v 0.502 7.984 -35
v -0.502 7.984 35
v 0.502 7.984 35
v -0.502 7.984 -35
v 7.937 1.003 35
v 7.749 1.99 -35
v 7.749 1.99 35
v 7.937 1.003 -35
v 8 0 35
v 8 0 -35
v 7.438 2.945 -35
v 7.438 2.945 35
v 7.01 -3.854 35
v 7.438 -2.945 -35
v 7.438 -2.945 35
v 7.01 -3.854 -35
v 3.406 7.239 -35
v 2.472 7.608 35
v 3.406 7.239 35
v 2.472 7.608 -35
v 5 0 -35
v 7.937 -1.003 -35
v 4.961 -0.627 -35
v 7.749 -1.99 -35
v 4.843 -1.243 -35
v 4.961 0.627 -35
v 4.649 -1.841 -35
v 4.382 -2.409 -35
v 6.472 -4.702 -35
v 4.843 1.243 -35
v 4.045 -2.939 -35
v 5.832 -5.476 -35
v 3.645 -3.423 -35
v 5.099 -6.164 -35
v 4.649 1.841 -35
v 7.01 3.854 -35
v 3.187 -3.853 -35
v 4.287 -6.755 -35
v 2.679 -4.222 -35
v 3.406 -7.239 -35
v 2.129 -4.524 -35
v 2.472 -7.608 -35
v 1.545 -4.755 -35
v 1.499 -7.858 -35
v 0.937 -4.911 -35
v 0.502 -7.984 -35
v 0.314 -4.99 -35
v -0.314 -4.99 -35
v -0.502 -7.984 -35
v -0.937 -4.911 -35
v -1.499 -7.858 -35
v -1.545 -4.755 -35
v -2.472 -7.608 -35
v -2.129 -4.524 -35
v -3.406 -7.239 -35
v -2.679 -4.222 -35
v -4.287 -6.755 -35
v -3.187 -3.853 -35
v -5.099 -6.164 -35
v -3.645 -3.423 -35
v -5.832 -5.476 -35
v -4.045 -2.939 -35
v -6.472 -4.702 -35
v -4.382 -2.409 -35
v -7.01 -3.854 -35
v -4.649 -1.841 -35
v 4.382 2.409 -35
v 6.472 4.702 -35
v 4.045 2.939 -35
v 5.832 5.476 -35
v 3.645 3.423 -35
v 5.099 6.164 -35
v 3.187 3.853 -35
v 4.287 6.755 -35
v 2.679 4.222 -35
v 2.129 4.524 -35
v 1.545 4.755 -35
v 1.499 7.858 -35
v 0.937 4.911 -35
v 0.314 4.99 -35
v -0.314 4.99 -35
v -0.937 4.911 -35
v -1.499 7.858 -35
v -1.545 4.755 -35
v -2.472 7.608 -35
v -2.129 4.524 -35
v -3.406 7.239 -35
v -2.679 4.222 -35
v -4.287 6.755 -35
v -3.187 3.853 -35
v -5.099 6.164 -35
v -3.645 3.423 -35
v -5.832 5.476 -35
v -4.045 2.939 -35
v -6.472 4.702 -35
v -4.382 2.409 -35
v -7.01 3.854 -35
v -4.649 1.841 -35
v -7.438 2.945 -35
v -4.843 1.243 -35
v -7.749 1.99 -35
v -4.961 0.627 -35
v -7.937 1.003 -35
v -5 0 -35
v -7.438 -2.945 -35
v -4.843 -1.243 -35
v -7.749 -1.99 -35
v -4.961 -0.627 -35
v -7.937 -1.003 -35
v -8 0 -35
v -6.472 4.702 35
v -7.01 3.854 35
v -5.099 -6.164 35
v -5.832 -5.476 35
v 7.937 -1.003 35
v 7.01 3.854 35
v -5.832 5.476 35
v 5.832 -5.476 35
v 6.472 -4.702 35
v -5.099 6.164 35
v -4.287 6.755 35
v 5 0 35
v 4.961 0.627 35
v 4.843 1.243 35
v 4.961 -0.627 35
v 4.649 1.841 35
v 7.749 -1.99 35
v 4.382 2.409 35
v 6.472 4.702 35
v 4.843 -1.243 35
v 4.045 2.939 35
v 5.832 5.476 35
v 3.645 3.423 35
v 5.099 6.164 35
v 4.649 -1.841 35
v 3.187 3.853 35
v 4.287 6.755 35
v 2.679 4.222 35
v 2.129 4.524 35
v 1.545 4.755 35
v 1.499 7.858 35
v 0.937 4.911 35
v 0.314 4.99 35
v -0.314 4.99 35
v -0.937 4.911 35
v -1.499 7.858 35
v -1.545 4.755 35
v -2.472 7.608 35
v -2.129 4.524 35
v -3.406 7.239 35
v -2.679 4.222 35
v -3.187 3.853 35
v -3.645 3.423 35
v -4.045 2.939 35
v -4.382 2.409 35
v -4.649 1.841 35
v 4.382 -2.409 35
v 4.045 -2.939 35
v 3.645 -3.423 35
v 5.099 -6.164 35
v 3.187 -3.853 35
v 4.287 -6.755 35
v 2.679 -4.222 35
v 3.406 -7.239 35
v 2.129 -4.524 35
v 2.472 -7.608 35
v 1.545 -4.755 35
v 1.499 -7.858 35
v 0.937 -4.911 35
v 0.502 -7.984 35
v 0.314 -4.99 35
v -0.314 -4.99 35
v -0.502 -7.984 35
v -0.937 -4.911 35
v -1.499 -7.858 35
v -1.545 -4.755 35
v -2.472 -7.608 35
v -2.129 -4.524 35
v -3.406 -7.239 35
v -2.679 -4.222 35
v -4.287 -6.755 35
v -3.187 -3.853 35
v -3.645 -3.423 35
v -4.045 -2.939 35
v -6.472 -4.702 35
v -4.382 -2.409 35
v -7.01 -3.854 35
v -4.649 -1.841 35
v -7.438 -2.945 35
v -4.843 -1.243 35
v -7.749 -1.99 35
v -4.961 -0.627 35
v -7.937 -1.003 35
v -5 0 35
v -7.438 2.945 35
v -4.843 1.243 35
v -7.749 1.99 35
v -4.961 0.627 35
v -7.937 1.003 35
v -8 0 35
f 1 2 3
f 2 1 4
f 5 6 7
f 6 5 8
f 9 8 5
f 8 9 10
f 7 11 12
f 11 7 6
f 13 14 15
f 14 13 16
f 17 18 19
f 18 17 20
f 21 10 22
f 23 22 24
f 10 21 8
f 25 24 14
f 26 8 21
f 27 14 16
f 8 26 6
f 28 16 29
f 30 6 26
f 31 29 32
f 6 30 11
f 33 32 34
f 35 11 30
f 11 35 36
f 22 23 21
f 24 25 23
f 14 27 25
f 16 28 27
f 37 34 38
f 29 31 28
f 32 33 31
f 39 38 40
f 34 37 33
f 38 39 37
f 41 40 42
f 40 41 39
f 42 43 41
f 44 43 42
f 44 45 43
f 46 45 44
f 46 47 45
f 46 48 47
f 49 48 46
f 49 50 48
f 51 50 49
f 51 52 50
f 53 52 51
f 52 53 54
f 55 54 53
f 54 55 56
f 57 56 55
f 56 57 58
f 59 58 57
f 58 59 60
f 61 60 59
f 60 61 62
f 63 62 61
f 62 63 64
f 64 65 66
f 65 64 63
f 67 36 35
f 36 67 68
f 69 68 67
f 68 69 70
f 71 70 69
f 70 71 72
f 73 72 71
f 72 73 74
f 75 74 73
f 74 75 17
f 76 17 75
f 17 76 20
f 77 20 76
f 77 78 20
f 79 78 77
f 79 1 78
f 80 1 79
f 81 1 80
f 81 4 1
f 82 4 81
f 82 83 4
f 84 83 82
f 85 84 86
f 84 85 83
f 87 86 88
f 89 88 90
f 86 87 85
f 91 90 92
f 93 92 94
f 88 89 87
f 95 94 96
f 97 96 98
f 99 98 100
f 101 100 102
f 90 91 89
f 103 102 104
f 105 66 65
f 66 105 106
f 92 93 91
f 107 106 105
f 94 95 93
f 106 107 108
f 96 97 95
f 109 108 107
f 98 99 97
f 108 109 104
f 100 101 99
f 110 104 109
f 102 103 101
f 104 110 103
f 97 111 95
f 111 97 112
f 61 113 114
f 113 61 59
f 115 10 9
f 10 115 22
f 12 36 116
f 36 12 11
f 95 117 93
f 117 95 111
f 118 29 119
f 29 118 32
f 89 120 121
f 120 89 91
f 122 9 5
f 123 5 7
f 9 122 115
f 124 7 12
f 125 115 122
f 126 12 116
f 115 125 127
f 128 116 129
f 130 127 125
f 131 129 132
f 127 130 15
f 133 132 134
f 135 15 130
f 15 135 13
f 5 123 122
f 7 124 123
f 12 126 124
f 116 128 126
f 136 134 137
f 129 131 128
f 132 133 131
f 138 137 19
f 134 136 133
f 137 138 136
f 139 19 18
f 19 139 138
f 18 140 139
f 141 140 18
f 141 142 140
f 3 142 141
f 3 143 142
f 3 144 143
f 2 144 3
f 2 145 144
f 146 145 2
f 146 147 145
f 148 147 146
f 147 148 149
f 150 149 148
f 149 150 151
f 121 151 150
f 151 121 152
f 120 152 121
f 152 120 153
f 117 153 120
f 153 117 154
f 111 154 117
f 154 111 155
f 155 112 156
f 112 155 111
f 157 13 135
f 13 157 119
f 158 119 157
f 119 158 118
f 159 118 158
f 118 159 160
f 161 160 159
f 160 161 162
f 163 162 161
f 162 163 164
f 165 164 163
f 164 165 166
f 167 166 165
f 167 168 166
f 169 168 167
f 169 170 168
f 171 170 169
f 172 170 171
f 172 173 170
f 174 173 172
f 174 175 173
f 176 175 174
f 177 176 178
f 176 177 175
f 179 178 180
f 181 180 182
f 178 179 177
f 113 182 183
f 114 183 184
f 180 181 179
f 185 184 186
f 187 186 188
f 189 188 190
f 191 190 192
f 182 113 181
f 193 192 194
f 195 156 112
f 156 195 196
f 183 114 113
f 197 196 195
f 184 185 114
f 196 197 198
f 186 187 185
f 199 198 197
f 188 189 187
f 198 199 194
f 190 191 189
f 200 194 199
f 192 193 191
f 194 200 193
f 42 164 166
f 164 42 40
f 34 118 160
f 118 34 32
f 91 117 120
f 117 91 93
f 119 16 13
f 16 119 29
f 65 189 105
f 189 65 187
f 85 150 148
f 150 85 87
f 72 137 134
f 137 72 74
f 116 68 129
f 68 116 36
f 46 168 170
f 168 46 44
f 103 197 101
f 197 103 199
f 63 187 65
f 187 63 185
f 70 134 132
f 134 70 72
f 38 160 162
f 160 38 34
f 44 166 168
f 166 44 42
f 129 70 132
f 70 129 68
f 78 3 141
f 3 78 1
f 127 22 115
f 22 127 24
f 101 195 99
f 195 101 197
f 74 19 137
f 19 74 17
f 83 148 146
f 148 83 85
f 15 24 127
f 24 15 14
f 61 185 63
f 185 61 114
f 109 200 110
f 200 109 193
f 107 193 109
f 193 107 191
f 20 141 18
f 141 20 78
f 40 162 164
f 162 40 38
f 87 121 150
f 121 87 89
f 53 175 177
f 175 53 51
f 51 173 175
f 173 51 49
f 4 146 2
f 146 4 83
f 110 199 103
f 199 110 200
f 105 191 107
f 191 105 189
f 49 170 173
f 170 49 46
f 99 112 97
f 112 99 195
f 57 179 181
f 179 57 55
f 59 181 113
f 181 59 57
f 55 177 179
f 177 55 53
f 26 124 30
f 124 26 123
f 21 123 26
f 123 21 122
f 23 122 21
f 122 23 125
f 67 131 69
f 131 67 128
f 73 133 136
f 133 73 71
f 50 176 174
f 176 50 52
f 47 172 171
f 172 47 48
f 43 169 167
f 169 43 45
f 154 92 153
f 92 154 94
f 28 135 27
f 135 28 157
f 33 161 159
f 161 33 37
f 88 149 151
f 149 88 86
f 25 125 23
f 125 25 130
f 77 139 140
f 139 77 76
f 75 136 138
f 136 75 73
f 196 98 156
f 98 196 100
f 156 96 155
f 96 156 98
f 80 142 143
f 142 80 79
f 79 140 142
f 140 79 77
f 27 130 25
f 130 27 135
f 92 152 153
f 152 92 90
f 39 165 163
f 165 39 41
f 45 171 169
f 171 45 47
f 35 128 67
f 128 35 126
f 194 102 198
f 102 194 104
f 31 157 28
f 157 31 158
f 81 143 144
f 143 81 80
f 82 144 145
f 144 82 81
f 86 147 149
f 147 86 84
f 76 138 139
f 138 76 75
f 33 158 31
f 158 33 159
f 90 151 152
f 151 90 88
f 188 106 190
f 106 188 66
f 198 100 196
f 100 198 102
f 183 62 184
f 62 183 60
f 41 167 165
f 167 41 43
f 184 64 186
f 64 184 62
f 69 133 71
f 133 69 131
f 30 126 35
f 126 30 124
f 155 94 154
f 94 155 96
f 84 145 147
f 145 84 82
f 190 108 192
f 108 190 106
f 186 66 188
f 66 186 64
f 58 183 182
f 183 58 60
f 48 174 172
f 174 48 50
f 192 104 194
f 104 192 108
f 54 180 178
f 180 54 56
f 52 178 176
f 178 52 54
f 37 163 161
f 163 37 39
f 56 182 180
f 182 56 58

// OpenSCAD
$fn = 50;


difference() {
	union() {
		translate(v = [0, 0, -35.0000000000]) {
			cylinder(h = 70, r = 8.0000000000);
		}
	}
	union() {
		translate(v = [0, 0, -100.0000000000]) {
			cylinder(h = 200, r = 5.0000000000);
		}
	}
}
